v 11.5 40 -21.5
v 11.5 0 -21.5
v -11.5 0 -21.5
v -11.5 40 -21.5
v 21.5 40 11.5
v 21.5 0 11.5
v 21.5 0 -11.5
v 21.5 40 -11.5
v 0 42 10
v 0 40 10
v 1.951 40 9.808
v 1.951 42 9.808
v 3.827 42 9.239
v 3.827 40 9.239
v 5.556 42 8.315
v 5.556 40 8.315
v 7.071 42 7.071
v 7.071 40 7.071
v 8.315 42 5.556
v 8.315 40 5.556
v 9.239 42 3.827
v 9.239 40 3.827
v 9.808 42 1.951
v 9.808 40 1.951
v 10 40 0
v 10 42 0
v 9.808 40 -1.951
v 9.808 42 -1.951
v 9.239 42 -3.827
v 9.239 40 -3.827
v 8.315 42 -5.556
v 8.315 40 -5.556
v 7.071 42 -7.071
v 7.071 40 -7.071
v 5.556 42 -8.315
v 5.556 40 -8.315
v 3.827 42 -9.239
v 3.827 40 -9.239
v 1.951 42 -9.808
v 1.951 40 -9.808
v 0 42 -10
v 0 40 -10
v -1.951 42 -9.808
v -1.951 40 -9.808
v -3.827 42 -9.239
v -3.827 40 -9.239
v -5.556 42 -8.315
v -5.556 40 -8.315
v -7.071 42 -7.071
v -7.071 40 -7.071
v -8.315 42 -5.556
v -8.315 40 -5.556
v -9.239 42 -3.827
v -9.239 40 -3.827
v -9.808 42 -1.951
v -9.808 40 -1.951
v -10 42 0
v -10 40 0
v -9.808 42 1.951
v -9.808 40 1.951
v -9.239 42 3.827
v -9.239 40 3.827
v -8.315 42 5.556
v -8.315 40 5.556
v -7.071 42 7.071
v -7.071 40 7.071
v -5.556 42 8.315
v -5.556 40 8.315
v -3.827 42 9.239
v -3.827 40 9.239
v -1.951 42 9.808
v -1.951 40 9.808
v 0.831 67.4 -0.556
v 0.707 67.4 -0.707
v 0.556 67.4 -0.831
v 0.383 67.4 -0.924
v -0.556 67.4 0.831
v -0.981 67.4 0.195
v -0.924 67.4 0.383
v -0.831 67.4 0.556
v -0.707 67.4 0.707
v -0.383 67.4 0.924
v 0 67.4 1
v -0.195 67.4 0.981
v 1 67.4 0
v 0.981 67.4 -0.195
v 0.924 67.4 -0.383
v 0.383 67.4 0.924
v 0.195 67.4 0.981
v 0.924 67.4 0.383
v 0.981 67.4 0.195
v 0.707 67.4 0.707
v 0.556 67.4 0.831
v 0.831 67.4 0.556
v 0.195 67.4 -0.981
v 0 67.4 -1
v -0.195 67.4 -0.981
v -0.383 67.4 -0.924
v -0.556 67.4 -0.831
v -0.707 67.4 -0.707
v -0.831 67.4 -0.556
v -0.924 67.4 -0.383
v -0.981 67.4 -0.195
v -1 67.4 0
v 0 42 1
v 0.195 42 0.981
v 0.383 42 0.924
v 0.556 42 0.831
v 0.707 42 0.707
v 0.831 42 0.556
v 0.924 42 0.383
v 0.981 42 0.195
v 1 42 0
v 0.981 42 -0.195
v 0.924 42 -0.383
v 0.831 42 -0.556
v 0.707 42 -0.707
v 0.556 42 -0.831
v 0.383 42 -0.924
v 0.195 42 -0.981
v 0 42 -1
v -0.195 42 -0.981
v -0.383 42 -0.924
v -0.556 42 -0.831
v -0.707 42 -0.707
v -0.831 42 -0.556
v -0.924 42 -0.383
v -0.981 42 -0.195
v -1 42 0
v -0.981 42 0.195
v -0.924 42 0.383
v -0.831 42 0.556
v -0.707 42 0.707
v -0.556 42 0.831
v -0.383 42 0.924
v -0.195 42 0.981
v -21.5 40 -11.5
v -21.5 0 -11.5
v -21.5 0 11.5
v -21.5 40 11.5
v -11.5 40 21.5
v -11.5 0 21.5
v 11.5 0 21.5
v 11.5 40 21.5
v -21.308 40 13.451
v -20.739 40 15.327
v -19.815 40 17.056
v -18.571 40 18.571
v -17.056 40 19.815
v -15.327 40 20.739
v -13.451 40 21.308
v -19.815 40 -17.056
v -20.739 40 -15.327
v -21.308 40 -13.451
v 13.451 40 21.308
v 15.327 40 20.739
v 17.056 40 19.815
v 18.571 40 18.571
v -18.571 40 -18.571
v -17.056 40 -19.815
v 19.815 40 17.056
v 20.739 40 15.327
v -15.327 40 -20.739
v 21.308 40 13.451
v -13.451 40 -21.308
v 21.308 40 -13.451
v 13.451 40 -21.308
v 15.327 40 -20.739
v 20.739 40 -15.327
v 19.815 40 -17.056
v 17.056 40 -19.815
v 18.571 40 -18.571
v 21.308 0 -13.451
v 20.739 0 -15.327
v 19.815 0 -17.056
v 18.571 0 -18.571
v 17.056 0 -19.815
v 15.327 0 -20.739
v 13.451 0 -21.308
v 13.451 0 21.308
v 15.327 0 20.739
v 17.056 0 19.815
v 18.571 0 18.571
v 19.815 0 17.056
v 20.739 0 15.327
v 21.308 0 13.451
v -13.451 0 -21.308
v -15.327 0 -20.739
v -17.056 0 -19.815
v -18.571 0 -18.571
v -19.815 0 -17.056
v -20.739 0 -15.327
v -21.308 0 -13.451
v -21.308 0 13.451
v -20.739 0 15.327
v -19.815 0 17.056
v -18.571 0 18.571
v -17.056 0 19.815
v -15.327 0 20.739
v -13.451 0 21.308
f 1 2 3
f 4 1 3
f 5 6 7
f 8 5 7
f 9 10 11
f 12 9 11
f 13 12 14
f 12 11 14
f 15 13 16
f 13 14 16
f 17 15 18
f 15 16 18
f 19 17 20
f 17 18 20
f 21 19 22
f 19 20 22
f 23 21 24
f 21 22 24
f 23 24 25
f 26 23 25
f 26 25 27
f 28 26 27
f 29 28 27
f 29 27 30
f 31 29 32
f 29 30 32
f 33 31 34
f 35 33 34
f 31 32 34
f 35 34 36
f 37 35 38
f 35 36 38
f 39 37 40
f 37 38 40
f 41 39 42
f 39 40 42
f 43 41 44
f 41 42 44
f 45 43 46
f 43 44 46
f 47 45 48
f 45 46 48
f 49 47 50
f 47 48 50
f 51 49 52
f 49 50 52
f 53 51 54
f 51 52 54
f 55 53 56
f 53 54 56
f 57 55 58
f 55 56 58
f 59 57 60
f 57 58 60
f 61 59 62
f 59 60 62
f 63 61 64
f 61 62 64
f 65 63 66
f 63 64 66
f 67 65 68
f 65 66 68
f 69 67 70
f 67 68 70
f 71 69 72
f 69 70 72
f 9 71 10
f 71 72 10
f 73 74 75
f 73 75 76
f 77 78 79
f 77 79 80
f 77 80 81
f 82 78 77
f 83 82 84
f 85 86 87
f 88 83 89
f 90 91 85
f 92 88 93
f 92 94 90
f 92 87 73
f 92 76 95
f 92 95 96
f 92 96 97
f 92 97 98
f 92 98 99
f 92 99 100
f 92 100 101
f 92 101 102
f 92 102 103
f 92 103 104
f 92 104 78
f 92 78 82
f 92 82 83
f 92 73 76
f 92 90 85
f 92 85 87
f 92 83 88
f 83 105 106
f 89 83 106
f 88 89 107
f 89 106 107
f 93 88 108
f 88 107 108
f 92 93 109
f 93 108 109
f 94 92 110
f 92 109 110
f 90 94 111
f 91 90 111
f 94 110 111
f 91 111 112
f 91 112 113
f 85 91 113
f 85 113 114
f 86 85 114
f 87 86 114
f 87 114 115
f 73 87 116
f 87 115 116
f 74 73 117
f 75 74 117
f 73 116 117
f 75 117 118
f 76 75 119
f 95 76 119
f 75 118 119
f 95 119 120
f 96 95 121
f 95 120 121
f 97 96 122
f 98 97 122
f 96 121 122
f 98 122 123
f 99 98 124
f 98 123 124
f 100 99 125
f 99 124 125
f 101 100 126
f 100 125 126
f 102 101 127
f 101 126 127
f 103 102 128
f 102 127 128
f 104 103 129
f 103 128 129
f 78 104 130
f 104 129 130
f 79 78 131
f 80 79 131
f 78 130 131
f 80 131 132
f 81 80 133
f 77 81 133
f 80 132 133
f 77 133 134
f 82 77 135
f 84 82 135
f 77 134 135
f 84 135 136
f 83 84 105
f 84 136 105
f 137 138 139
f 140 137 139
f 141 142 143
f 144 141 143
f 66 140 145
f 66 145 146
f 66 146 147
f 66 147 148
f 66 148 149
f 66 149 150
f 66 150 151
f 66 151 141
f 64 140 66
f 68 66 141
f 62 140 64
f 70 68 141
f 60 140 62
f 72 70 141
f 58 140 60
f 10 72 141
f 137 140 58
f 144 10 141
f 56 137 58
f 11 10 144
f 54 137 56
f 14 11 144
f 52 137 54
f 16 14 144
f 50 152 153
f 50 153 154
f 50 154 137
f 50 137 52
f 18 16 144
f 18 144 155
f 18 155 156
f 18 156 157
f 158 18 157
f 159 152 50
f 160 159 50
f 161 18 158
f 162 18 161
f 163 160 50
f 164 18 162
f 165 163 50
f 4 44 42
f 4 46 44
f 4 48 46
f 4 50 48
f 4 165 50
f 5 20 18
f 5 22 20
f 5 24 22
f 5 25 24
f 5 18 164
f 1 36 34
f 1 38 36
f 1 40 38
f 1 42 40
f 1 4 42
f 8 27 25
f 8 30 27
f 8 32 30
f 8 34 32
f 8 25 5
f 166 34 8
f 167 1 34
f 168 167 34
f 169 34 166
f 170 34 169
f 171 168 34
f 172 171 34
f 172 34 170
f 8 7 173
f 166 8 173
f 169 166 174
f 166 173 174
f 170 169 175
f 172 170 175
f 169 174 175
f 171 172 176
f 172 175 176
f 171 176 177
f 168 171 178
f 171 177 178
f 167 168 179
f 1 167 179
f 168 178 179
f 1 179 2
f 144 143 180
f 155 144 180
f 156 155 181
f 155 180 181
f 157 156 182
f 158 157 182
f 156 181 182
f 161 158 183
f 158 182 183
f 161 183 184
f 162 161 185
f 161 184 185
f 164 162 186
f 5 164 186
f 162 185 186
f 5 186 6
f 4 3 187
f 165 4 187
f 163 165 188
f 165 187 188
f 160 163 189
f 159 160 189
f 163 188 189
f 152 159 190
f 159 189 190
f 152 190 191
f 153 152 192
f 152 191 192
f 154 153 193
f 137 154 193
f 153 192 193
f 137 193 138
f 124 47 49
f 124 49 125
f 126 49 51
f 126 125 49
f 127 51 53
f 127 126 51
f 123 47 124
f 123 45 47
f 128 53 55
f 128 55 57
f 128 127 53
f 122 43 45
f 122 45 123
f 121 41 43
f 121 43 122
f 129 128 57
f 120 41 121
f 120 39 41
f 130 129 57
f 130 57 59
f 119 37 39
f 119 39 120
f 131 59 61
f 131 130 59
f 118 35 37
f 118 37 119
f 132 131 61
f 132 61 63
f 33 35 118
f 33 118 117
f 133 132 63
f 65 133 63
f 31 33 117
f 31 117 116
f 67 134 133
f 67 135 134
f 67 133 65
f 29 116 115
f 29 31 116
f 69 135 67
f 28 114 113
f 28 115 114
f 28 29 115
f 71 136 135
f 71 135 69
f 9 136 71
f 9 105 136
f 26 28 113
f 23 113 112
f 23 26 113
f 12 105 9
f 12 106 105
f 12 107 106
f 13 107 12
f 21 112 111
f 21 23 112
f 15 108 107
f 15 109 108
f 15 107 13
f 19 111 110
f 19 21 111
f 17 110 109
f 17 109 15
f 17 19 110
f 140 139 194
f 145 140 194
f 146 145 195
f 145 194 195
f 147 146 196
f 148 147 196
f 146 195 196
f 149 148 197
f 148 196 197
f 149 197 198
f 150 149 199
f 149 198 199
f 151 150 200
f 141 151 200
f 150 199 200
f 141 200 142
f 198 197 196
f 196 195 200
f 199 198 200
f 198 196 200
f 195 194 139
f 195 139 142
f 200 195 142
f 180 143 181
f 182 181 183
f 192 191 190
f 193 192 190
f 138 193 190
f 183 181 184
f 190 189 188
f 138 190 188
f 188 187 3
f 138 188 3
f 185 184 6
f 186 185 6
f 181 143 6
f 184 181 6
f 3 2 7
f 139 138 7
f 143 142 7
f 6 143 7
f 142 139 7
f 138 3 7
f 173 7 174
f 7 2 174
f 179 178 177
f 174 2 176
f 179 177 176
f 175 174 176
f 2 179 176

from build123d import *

# Parameters (mm, degrees)
BOSS_EXTRUDE1_DEPTH = 40
SKETCH2_R           = 10
BOSS_EXTRUDE2_DEPTH = 2
SKETCH3_R           = 1
BOSS_EXTRUDE3_DEPTH = 25.4


with BuildPart() as part:
    # Sketch1 → Boss-Extrude1 (new body)
    with BuildSketch(Plane(origin=(0, 0, 0), x_dir=(1, 0, 0), z_dir=(0, 1, 0))):
        with BuildLine():
            Line((11.5, 21.5), (-11.5, 21.5))
            ThreePointArc((-11.5, 21.5), (-18.571067812, 18.571067812), (-21.5, 11.5))
            Line((-21.5, 11.5), (-21.5, -11.5))
            ThreePointArc((-21.5, -11.5), (-18.571067812, -18.571067812), (-11.5, -21.5))
            Line((-11.5, -21.5), (11.5, -21.5))
            ThreePointArc((11.5, -21.5), (18.571067812, -18.571067812), (21.5, -11.5))
            Line((21.5, -11.5), (21.5, 11.5))
            ThreePointArc((21.5, 11.5), (18.571067812, 18.571067812), (11.5, 21.5))
        make_face()
    extrude(amount=BOSS_EXTRUDE1_DEPTH)

    # Sketch2 → Boss-Extrude2 (add)
    with BuildSketch(Plane(origin=(0, 40, 0), x_dir=(1, 0, 0), z_dir=(0, 1, 0))):
        with Locations(Location((0, 0, 0), (0, 0, 270))):
            Circle(SKETCH2_R)
    extrude(amount=BOSS_EXTRUDE2_DEPTH)

    # Sketch3 → Boss-Extrude3 (add)
    with BuildSketch(Plane(origin=(0, 42, 0), x_dir=(1, 0, 0), z_dir=(0, 1, 0))):
        with Locations(Location((0, 0, 0), (0, 0, 270))):
            Circle(SKETCH3_R)
    extrude(amount=BOSS_EXTRUDE3_DEPTH)


solid = part.part
